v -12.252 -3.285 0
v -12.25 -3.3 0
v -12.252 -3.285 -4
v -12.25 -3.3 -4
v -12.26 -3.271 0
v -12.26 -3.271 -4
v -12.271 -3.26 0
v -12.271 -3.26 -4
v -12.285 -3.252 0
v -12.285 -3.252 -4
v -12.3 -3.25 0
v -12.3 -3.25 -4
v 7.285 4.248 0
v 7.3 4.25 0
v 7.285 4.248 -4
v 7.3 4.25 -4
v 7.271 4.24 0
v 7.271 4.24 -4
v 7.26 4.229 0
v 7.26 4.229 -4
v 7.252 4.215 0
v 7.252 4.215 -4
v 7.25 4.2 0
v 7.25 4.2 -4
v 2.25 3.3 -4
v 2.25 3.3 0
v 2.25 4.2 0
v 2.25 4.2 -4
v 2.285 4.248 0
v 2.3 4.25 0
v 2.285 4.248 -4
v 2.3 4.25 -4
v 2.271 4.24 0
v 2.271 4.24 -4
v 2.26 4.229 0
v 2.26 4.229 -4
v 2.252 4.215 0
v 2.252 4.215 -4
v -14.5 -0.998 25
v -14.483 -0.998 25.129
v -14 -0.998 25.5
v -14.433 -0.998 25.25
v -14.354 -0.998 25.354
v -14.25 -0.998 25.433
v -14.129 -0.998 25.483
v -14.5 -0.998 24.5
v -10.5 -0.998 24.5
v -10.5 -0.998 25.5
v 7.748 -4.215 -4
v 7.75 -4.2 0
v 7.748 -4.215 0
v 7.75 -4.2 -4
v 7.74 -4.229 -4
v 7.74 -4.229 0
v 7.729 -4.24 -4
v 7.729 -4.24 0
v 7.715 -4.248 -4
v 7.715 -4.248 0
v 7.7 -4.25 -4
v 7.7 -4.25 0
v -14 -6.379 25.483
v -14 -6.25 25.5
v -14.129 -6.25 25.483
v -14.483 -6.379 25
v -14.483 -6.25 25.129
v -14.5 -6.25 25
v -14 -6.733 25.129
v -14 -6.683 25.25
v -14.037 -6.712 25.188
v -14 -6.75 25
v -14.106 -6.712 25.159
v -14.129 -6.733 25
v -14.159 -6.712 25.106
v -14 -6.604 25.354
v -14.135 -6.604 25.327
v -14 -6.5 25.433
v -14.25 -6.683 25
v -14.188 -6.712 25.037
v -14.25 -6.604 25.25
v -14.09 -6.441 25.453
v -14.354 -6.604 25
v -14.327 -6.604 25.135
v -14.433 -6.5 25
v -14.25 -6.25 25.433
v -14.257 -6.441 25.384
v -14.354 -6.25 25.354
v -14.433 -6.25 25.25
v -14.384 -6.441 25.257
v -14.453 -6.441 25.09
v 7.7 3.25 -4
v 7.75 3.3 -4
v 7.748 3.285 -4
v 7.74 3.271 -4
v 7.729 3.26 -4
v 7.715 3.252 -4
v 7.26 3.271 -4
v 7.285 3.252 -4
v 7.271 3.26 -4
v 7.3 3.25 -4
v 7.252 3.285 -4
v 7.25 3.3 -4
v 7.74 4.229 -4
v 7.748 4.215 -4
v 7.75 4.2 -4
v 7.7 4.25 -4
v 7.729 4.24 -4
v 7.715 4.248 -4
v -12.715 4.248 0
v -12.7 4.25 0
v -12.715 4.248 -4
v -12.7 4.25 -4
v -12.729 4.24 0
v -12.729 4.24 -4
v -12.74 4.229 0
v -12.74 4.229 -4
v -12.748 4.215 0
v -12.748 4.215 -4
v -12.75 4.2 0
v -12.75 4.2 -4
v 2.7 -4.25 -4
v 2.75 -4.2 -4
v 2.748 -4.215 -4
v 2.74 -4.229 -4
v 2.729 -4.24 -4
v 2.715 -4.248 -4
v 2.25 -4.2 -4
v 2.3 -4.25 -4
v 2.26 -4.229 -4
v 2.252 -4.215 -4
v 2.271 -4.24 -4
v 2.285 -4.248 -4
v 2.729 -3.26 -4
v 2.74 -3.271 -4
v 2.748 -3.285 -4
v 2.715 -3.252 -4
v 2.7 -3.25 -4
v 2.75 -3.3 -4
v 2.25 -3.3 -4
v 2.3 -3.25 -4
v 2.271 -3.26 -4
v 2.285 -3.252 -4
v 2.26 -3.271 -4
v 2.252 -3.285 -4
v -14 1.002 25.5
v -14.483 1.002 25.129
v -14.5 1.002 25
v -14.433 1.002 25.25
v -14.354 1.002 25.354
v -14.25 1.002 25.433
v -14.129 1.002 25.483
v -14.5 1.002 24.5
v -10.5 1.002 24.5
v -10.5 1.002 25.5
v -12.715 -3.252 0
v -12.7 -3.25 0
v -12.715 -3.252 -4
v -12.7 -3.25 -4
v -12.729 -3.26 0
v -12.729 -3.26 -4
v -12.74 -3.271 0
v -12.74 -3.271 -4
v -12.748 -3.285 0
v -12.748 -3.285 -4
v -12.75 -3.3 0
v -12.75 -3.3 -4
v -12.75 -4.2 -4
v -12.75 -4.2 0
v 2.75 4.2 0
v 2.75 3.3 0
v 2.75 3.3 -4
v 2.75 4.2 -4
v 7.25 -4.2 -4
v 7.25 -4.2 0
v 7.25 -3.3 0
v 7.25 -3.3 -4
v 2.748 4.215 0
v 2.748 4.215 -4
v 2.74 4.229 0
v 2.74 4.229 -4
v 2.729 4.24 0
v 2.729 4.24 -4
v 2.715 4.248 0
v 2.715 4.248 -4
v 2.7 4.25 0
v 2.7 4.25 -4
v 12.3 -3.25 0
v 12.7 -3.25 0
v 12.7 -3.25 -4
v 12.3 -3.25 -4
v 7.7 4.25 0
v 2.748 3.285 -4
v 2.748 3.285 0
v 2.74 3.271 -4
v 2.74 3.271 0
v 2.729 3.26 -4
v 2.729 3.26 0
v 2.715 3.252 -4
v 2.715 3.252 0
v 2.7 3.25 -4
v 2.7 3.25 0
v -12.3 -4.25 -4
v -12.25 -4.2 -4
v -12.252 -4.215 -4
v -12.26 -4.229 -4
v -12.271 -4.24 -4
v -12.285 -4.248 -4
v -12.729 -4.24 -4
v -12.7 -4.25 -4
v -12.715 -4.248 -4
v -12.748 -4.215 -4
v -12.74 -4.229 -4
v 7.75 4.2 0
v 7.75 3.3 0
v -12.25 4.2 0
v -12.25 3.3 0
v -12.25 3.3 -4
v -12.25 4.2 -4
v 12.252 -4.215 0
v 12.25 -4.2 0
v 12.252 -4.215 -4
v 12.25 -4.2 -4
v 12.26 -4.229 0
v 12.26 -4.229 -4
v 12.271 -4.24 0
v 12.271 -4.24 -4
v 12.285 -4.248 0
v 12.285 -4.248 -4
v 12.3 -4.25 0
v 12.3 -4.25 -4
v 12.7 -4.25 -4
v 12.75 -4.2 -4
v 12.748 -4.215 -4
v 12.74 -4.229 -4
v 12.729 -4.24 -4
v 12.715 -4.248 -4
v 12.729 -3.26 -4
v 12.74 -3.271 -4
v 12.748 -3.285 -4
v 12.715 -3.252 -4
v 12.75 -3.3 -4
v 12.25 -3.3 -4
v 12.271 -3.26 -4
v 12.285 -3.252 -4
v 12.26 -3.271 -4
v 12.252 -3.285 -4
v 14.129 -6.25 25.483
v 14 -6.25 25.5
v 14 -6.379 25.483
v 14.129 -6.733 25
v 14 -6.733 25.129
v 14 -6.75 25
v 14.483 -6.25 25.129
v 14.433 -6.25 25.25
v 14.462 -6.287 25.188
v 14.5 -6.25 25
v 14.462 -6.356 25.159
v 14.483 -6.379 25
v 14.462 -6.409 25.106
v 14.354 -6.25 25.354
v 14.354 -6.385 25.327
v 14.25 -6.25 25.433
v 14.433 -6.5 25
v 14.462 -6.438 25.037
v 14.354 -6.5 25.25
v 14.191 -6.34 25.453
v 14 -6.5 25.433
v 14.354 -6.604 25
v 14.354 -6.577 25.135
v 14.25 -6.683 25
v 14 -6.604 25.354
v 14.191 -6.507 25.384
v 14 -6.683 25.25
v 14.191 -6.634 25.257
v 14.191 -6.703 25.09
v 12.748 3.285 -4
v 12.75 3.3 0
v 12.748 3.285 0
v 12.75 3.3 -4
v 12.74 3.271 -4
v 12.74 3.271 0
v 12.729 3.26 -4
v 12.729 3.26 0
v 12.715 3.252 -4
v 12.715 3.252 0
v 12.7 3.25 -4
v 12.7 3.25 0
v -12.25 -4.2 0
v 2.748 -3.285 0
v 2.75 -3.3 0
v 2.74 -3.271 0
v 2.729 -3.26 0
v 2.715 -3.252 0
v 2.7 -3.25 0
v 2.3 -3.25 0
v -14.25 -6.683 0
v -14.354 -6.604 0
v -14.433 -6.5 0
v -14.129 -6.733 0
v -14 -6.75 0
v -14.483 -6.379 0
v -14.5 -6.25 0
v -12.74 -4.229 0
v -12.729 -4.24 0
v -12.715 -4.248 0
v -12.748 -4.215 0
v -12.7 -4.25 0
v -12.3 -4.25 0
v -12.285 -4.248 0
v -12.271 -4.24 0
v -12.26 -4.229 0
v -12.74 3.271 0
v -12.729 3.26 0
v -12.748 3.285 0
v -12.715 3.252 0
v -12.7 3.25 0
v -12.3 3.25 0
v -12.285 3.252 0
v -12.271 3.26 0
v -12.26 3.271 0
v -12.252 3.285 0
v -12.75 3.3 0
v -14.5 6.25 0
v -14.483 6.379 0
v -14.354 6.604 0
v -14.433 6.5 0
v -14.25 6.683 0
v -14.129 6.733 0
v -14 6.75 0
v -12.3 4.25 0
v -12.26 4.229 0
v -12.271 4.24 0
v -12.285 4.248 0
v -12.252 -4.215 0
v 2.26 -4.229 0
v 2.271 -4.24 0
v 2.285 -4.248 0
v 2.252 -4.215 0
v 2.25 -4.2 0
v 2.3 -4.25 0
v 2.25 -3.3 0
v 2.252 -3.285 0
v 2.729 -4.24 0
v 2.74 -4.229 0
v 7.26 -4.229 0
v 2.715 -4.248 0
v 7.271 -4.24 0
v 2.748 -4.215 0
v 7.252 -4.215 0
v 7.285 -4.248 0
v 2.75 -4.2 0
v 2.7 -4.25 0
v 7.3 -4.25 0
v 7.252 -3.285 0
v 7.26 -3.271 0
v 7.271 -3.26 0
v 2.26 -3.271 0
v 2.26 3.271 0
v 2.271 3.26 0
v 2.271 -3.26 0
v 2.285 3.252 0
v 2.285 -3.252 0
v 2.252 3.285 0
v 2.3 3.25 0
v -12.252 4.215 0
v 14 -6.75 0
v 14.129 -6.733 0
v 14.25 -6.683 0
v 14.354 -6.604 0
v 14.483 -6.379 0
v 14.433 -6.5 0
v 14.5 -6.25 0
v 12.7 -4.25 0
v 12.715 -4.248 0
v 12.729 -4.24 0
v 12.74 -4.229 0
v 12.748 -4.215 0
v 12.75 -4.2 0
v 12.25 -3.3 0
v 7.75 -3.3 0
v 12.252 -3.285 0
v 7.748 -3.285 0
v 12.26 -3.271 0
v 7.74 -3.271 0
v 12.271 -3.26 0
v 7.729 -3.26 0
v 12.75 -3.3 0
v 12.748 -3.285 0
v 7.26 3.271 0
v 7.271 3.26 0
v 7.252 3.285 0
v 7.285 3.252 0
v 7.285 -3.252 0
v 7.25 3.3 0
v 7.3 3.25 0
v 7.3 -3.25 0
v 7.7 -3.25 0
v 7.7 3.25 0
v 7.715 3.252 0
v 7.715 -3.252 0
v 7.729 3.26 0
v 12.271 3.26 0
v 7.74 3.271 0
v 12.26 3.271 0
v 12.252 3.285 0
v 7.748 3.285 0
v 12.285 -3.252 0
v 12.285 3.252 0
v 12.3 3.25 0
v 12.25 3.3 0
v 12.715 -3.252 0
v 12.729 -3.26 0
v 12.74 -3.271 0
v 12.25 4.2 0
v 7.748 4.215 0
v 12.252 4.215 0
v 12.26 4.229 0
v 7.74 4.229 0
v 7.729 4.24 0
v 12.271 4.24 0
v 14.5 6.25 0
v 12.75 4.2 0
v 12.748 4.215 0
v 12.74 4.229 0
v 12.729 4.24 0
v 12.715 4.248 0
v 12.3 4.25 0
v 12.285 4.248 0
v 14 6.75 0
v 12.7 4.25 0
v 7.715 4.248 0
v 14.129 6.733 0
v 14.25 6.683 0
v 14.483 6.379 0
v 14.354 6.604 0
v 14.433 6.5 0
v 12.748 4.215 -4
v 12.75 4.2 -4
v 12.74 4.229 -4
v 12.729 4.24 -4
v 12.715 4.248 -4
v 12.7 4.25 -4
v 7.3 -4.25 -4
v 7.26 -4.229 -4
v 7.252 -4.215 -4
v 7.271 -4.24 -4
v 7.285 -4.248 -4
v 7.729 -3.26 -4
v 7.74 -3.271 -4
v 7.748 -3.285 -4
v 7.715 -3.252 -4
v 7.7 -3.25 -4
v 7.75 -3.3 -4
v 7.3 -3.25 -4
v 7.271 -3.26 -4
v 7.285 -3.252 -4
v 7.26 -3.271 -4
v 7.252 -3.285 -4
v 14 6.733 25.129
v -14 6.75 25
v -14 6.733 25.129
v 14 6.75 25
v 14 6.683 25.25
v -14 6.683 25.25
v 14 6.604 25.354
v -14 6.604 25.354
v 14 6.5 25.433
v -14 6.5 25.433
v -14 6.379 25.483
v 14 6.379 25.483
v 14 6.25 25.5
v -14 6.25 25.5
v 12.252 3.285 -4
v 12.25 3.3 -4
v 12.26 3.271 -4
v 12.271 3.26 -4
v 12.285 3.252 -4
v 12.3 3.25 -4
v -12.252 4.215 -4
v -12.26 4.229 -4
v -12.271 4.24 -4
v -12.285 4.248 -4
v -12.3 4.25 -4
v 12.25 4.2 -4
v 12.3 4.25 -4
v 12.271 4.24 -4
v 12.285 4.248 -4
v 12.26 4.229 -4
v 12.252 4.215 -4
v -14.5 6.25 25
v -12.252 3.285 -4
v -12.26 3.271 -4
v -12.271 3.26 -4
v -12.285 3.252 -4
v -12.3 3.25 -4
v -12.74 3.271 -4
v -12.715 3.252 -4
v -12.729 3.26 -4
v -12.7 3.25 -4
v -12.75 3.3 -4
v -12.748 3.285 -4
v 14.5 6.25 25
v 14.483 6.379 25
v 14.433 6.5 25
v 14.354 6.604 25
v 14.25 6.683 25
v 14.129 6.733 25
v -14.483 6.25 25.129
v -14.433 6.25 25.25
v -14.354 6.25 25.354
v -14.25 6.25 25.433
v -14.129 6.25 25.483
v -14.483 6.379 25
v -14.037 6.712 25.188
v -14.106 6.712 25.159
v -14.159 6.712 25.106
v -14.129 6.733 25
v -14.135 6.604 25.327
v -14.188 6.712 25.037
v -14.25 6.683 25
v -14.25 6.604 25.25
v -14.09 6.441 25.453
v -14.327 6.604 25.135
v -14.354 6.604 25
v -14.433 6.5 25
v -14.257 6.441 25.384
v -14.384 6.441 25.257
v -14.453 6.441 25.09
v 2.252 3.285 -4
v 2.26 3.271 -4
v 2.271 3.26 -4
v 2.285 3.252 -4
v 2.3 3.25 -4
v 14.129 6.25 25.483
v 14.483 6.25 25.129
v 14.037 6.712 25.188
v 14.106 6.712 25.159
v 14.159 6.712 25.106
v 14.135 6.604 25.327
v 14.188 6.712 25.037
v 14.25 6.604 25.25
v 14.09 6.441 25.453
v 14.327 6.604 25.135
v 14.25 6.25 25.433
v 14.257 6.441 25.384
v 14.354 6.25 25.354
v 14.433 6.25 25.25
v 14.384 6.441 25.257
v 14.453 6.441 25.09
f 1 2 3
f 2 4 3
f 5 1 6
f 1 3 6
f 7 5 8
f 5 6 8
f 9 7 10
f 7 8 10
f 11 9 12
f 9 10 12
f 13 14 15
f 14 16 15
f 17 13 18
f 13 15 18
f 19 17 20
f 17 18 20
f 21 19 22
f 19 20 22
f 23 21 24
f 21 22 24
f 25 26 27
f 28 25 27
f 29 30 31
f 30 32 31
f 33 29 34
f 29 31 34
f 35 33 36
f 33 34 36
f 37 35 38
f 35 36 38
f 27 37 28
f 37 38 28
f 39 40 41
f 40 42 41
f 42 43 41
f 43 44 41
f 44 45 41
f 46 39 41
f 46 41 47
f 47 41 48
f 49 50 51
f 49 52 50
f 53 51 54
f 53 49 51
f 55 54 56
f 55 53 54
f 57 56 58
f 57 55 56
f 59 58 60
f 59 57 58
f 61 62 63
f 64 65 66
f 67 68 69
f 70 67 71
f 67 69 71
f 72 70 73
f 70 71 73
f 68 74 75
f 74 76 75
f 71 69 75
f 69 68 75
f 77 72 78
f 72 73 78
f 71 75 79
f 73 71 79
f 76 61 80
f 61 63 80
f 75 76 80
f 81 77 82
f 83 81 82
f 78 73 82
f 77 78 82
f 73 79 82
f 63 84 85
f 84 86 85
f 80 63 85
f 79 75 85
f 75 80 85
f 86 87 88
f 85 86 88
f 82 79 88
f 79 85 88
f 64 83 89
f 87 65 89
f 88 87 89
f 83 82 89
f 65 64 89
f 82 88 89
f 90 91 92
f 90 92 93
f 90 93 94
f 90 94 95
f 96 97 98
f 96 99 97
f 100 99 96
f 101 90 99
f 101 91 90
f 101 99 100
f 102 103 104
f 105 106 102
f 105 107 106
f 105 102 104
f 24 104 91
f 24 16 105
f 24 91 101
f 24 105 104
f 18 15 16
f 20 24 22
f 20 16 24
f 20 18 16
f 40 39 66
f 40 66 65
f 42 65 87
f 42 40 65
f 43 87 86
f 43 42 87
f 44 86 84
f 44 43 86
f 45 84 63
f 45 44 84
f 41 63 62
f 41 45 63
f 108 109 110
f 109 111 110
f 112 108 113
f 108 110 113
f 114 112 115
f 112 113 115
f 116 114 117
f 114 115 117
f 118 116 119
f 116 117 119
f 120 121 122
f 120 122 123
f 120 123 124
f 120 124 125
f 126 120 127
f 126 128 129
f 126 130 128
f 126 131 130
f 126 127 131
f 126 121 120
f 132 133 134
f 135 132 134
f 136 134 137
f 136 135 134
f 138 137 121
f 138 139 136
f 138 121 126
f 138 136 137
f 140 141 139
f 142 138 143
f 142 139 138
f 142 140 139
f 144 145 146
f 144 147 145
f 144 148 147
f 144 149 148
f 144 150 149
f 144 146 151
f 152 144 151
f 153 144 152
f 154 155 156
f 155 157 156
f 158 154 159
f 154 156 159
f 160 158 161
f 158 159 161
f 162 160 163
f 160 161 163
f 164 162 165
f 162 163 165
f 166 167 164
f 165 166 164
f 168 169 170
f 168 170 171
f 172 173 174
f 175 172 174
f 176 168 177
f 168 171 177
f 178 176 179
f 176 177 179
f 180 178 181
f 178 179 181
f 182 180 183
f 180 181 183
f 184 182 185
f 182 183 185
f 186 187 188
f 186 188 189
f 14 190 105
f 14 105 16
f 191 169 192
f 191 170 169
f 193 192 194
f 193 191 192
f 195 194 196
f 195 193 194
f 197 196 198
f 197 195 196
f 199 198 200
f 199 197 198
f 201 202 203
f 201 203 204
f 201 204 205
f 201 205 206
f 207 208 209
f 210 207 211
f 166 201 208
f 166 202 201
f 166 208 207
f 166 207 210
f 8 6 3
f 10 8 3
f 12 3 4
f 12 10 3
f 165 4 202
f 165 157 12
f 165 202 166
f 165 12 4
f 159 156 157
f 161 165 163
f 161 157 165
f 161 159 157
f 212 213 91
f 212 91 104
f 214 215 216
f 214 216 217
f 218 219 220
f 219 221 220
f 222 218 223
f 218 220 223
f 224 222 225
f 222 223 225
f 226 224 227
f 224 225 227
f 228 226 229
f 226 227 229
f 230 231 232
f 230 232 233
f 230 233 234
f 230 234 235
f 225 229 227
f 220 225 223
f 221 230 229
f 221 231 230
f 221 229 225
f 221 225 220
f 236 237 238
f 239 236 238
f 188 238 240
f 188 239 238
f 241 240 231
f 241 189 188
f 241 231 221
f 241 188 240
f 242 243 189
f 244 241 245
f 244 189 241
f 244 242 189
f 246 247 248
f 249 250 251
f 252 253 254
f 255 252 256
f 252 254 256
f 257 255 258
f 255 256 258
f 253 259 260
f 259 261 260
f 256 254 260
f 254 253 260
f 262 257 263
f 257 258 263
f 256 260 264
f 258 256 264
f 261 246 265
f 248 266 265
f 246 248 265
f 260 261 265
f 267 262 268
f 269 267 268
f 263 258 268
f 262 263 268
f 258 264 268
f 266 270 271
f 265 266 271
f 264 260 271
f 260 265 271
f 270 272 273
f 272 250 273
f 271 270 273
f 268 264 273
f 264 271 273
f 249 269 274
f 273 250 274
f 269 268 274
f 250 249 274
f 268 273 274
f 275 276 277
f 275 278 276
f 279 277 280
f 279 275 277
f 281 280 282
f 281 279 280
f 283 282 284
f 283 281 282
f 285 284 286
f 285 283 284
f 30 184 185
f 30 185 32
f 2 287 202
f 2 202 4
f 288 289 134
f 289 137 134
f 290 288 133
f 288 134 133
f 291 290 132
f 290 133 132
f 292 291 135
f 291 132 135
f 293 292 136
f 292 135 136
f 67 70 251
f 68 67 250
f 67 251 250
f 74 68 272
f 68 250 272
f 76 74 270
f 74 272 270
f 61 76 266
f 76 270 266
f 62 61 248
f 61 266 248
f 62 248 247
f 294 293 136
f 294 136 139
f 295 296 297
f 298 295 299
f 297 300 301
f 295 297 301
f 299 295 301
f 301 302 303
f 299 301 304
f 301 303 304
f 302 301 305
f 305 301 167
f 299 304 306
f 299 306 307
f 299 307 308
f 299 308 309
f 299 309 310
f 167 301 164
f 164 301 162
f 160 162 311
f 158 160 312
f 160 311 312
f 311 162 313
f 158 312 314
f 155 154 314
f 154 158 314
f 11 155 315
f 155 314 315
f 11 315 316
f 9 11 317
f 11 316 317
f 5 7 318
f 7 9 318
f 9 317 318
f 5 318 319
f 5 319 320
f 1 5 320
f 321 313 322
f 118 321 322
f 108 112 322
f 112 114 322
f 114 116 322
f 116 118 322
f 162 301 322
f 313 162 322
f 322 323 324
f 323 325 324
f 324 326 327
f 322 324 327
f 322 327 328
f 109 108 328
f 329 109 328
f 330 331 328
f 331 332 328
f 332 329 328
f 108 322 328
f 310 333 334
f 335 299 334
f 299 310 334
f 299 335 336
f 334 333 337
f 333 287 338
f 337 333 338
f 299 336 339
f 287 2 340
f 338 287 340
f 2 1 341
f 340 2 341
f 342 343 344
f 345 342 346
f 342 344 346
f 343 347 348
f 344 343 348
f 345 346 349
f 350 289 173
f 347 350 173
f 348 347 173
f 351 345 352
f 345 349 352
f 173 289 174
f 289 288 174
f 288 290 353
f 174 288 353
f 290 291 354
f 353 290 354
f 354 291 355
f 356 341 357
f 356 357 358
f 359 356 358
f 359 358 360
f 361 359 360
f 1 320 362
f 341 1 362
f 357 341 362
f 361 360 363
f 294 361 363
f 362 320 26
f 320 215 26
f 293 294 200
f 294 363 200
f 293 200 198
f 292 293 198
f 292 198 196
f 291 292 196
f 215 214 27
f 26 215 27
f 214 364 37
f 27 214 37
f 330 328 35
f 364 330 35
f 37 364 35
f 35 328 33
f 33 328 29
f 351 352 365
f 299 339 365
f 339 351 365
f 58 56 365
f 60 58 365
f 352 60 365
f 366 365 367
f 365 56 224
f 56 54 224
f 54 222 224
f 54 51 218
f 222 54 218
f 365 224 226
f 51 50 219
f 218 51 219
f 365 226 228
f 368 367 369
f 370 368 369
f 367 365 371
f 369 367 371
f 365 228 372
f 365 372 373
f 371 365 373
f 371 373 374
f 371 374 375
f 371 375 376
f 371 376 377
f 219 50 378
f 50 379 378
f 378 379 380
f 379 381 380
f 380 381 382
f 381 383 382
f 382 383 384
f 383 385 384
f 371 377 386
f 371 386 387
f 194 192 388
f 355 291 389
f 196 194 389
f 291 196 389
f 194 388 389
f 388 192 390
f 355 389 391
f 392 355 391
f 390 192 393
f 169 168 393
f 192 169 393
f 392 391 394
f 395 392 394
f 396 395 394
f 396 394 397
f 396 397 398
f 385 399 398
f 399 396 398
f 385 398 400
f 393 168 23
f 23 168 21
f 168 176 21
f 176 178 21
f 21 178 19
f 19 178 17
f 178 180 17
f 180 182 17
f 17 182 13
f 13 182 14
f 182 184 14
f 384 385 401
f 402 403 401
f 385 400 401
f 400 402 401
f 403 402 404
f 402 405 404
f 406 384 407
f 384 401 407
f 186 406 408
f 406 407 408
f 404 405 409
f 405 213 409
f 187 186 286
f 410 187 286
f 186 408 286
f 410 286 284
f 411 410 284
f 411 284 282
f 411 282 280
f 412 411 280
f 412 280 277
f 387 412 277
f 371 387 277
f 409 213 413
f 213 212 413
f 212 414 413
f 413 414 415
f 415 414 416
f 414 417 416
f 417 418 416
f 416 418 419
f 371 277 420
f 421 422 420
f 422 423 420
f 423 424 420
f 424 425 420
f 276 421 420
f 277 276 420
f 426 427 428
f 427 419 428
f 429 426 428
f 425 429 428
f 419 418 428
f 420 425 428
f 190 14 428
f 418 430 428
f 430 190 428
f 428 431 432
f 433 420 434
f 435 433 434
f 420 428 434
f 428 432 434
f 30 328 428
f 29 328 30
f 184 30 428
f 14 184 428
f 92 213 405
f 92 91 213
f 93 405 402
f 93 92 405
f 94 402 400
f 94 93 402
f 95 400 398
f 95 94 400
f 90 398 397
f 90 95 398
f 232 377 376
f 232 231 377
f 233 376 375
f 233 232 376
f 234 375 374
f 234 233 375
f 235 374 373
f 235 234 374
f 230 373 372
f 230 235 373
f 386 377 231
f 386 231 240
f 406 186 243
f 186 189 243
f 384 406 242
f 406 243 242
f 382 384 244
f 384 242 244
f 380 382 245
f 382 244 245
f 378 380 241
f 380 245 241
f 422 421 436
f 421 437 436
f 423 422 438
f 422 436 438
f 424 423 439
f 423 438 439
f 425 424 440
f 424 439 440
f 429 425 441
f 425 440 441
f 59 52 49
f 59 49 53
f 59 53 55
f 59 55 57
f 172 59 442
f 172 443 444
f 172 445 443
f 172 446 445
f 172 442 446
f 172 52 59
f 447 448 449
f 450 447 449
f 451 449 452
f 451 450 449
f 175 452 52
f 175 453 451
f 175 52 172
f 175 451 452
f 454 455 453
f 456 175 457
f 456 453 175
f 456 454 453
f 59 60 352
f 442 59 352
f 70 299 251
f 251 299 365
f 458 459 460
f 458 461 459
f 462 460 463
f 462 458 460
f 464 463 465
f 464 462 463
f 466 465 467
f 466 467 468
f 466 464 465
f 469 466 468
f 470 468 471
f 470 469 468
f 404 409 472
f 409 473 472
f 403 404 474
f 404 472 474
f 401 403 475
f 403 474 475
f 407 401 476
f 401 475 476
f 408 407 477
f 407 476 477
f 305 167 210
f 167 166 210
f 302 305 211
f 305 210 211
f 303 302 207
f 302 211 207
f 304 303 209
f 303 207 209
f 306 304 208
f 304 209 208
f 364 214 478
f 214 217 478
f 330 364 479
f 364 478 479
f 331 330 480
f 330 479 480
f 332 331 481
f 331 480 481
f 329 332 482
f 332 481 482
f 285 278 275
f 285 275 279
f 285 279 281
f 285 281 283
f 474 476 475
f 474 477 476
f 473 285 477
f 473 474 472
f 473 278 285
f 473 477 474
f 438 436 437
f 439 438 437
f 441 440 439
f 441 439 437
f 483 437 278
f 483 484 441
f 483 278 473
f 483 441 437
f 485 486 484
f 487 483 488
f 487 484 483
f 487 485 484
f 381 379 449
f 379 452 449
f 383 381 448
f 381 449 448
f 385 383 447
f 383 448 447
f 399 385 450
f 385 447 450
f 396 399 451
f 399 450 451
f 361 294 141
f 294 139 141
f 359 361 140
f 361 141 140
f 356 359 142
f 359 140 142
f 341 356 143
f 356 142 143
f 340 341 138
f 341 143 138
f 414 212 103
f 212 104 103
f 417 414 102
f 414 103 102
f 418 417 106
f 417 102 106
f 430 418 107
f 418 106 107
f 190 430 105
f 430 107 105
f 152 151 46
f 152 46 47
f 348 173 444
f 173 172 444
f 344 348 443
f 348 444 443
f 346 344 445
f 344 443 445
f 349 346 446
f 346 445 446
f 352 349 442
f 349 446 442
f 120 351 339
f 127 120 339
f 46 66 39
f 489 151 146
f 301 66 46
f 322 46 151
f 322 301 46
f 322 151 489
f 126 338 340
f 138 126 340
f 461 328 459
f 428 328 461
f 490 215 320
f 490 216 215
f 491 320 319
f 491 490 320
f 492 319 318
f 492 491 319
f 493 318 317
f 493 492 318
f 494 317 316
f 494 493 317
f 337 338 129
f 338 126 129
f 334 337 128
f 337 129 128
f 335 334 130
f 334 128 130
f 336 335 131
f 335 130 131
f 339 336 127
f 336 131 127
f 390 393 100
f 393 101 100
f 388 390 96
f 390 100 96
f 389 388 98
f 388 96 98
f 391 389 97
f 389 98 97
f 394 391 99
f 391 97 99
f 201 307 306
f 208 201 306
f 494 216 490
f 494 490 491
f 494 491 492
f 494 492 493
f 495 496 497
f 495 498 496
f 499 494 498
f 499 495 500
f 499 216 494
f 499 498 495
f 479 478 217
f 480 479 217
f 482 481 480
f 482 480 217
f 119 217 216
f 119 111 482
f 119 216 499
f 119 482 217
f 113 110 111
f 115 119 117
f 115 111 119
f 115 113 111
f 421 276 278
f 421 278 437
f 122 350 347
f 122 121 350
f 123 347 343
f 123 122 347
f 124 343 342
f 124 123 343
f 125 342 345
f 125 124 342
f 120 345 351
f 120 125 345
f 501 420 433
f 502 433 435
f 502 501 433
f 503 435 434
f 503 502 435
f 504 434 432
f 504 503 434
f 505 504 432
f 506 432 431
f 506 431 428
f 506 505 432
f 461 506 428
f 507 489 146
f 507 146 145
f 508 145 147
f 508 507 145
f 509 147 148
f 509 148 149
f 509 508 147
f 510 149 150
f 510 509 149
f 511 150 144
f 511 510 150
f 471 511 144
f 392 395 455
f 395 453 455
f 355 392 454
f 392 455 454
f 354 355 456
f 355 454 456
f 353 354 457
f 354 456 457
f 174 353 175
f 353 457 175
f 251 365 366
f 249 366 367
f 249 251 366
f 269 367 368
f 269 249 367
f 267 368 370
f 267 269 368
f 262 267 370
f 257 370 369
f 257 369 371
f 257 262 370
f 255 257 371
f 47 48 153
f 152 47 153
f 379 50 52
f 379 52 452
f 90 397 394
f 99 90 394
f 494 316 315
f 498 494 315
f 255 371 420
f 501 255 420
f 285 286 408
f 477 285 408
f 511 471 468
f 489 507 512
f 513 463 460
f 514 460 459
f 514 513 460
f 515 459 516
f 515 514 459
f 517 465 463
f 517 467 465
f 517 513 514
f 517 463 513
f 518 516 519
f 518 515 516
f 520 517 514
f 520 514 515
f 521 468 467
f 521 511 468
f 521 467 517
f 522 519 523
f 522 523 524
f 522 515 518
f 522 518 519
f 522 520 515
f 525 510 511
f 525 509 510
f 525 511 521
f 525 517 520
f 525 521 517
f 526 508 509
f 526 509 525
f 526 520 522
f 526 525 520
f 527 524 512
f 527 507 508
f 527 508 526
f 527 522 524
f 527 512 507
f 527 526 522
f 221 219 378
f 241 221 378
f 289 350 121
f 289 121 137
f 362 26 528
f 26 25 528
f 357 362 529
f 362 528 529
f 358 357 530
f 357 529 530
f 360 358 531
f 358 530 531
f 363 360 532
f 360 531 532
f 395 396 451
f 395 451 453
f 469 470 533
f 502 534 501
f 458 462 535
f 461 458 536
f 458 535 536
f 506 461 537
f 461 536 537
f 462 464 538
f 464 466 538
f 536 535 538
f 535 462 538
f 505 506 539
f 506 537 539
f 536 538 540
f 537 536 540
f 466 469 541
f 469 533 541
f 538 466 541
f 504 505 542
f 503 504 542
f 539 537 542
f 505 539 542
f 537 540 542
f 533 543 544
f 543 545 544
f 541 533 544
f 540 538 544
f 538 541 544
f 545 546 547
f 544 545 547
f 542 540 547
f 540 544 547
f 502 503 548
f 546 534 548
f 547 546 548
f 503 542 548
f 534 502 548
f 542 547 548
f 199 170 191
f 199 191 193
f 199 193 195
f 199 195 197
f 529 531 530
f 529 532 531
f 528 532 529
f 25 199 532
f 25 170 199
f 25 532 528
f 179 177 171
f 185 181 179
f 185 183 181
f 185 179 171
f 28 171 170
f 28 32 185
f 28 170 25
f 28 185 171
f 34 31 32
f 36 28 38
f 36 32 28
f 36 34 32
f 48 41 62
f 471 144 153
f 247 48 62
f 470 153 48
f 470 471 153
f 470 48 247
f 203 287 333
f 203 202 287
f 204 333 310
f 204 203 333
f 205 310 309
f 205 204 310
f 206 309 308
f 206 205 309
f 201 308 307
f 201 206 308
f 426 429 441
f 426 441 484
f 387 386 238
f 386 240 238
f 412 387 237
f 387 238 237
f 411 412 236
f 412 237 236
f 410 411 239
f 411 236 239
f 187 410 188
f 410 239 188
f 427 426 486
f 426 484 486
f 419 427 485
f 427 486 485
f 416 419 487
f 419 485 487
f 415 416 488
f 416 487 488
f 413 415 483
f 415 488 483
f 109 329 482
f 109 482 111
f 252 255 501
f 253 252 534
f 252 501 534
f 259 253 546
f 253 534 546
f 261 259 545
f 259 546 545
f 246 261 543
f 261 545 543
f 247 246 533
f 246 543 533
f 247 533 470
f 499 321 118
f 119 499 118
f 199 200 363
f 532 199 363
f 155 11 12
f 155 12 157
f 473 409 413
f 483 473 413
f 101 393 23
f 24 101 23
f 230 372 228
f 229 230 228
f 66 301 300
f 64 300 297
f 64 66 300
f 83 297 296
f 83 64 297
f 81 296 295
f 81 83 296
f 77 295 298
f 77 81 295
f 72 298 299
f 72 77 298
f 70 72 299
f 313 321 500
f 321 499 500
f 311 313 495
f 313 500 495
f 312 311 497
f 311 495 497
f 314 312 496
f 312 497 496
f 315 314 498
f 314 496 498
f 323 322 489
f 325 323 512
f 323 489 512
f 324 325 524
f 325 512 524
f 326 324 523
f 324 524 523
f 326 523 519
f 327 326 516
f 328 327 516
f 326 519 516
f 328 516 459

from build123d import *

# Parameters (mm, degrees)
SKETCH_1_W          = 29
SKETCH_1_H          = 13.5
EXTRUDE_1_DEPTH     = 25.5
FILLET_1_R          = 0.5
SKETCH_2_W          = 4
SKETCH_2_H          = 2
CUT_EXTRUDE_1_DEPTH = 1
SKETCH_3_W          = 0.5
SKETCH_3_H          = 1
EXTRUDE_2_DEPTH     = 4
FILLET_2_R          = 0.05


with BuildPart() as part:
    # Эскиз1 → Бобышка-Вытянуть1 (new body)
    with BuildSketch(Plane.XY):
        Rectangle(SKETCH_1_W, SKETCH_1_H)
    extrude(amount=EXTRUDE_1_DEPTH)

    # Скругление1
    fillet_1_edges = [part.edges().sort_by_distance(p)[0] for p in [
        (-14.5, 0, 25.5),
        (0, -6.75, 25.5),
        (14.5, 0, 25.5),
        (0, 6.75, 25.5),
        (14.5, -6.75, 12.75),
        (-14.5, -6.75, 12.75),
        (-14.5, 6.75, 12.75),
        (14.5, 6.75, 12.75),
    ]]
    fillet(fillet_1_edges, radius=FILLET_1_R)

    # Эскиз2 → Вырез-Вытянуть1 (cut)
    with BuildSketch(Plane.XY.offset(25.5)):
        with Locations((-12.5, 0.002144421)):
            Rectangle(SKETCH_2_W, SKETCH_2_H)
    extrude(amount=-CUT_EXTRUDE_1_DEPTH, mode=Mode.SUBTRACT)

    # Эскиз3 → Бобышка-Вытянуть2 (add)
    with BuildSketch(Plane(origin=(0, 0, 0), x_dir=(-1, 0, 0), z_dir=(0, 0, -1))):
        with Locations((12.5, -3.75)):
            Rectangle(SKETCH_3_W, SKETCH_3_H)
        with Locations((-2.5, -3.75)):
            Rectangle(SKETCH_3_W, SKETCH_3_H)
        with Locations((-7.5, -3.75)):
            Rectangle(SKETCH_3_W, SKETCH_3_H)
        with Locations((-12.5, -3.75)):
            Rectangle(SKETCH_3_W, SKETCH_3_H)
        with Locations((-12.5, 3.75)):
            Rectangle(SKETCH_3_W, SKETCH_3_H)
        with Locations((-7.5, 3.75)):
            Rectangle(SKETCH_3_W, SKETCH_3_H)
        with Locations((-2.5, 3.75)):
            Rectangle(SKETCH_3_W, SKETCH_3_H)
        with Locations((12.5, 3.75)):
            Rectangle(SKETCH_3_W, SKETCH_3_H)
    extrude(amount=EXTRUDE_2_DEPTH)

    # Скругление2
    fillet_2_edges = [part.edges().sort_by_distance(p)[0] for p in [
        (12.25, 3.25, -2),
        (12.25, 4.25, -2),
        (12.75, 4.25, -2),
        (12.75, 3.25, -2),
        (7.25, 3.25, -2),
        (7.25, 4.25, -2),
        (7.75, 4.25, -2),
        (7.75, 3.25, -2),
        (2.25, 3.25, -2),
        (2.25, 4.25, -2),
        (2.75, 4.25, -2),
        (2.75, 3.25, -2),
        (-12.75, 3.25, -2),
        (-12.75, 4.25, -2),
        (-12.25, 4.25, -2),
        (-12.25, 3.25, -2),
        (-12.25, -3.25, -2),
        (-12.25, -4.25, -2),
        (-12.75, -4.25, -2),
        (-12.75, -3.25, -2),
        (2.75, -3.25, -2),
        (2.75, -4.25, -2),
        (2.25, -4.25, -2),
        (2.25, -3.25, -2),
        (7.75, -3.25, -2),
        (7.75, -4.25, -2),
        (7.25, -4.25, -2),
        (7.25, -3.25, -2),
        (12.75, -3.25, -2),
        (12.75, -4.25, -2),
        (12.25, -4.25, -2),
        (12.25, -3.25, -2),
    ]]
    fillet(fillet_2_edges, radius=FILLET_2_R)


solid = part.part
